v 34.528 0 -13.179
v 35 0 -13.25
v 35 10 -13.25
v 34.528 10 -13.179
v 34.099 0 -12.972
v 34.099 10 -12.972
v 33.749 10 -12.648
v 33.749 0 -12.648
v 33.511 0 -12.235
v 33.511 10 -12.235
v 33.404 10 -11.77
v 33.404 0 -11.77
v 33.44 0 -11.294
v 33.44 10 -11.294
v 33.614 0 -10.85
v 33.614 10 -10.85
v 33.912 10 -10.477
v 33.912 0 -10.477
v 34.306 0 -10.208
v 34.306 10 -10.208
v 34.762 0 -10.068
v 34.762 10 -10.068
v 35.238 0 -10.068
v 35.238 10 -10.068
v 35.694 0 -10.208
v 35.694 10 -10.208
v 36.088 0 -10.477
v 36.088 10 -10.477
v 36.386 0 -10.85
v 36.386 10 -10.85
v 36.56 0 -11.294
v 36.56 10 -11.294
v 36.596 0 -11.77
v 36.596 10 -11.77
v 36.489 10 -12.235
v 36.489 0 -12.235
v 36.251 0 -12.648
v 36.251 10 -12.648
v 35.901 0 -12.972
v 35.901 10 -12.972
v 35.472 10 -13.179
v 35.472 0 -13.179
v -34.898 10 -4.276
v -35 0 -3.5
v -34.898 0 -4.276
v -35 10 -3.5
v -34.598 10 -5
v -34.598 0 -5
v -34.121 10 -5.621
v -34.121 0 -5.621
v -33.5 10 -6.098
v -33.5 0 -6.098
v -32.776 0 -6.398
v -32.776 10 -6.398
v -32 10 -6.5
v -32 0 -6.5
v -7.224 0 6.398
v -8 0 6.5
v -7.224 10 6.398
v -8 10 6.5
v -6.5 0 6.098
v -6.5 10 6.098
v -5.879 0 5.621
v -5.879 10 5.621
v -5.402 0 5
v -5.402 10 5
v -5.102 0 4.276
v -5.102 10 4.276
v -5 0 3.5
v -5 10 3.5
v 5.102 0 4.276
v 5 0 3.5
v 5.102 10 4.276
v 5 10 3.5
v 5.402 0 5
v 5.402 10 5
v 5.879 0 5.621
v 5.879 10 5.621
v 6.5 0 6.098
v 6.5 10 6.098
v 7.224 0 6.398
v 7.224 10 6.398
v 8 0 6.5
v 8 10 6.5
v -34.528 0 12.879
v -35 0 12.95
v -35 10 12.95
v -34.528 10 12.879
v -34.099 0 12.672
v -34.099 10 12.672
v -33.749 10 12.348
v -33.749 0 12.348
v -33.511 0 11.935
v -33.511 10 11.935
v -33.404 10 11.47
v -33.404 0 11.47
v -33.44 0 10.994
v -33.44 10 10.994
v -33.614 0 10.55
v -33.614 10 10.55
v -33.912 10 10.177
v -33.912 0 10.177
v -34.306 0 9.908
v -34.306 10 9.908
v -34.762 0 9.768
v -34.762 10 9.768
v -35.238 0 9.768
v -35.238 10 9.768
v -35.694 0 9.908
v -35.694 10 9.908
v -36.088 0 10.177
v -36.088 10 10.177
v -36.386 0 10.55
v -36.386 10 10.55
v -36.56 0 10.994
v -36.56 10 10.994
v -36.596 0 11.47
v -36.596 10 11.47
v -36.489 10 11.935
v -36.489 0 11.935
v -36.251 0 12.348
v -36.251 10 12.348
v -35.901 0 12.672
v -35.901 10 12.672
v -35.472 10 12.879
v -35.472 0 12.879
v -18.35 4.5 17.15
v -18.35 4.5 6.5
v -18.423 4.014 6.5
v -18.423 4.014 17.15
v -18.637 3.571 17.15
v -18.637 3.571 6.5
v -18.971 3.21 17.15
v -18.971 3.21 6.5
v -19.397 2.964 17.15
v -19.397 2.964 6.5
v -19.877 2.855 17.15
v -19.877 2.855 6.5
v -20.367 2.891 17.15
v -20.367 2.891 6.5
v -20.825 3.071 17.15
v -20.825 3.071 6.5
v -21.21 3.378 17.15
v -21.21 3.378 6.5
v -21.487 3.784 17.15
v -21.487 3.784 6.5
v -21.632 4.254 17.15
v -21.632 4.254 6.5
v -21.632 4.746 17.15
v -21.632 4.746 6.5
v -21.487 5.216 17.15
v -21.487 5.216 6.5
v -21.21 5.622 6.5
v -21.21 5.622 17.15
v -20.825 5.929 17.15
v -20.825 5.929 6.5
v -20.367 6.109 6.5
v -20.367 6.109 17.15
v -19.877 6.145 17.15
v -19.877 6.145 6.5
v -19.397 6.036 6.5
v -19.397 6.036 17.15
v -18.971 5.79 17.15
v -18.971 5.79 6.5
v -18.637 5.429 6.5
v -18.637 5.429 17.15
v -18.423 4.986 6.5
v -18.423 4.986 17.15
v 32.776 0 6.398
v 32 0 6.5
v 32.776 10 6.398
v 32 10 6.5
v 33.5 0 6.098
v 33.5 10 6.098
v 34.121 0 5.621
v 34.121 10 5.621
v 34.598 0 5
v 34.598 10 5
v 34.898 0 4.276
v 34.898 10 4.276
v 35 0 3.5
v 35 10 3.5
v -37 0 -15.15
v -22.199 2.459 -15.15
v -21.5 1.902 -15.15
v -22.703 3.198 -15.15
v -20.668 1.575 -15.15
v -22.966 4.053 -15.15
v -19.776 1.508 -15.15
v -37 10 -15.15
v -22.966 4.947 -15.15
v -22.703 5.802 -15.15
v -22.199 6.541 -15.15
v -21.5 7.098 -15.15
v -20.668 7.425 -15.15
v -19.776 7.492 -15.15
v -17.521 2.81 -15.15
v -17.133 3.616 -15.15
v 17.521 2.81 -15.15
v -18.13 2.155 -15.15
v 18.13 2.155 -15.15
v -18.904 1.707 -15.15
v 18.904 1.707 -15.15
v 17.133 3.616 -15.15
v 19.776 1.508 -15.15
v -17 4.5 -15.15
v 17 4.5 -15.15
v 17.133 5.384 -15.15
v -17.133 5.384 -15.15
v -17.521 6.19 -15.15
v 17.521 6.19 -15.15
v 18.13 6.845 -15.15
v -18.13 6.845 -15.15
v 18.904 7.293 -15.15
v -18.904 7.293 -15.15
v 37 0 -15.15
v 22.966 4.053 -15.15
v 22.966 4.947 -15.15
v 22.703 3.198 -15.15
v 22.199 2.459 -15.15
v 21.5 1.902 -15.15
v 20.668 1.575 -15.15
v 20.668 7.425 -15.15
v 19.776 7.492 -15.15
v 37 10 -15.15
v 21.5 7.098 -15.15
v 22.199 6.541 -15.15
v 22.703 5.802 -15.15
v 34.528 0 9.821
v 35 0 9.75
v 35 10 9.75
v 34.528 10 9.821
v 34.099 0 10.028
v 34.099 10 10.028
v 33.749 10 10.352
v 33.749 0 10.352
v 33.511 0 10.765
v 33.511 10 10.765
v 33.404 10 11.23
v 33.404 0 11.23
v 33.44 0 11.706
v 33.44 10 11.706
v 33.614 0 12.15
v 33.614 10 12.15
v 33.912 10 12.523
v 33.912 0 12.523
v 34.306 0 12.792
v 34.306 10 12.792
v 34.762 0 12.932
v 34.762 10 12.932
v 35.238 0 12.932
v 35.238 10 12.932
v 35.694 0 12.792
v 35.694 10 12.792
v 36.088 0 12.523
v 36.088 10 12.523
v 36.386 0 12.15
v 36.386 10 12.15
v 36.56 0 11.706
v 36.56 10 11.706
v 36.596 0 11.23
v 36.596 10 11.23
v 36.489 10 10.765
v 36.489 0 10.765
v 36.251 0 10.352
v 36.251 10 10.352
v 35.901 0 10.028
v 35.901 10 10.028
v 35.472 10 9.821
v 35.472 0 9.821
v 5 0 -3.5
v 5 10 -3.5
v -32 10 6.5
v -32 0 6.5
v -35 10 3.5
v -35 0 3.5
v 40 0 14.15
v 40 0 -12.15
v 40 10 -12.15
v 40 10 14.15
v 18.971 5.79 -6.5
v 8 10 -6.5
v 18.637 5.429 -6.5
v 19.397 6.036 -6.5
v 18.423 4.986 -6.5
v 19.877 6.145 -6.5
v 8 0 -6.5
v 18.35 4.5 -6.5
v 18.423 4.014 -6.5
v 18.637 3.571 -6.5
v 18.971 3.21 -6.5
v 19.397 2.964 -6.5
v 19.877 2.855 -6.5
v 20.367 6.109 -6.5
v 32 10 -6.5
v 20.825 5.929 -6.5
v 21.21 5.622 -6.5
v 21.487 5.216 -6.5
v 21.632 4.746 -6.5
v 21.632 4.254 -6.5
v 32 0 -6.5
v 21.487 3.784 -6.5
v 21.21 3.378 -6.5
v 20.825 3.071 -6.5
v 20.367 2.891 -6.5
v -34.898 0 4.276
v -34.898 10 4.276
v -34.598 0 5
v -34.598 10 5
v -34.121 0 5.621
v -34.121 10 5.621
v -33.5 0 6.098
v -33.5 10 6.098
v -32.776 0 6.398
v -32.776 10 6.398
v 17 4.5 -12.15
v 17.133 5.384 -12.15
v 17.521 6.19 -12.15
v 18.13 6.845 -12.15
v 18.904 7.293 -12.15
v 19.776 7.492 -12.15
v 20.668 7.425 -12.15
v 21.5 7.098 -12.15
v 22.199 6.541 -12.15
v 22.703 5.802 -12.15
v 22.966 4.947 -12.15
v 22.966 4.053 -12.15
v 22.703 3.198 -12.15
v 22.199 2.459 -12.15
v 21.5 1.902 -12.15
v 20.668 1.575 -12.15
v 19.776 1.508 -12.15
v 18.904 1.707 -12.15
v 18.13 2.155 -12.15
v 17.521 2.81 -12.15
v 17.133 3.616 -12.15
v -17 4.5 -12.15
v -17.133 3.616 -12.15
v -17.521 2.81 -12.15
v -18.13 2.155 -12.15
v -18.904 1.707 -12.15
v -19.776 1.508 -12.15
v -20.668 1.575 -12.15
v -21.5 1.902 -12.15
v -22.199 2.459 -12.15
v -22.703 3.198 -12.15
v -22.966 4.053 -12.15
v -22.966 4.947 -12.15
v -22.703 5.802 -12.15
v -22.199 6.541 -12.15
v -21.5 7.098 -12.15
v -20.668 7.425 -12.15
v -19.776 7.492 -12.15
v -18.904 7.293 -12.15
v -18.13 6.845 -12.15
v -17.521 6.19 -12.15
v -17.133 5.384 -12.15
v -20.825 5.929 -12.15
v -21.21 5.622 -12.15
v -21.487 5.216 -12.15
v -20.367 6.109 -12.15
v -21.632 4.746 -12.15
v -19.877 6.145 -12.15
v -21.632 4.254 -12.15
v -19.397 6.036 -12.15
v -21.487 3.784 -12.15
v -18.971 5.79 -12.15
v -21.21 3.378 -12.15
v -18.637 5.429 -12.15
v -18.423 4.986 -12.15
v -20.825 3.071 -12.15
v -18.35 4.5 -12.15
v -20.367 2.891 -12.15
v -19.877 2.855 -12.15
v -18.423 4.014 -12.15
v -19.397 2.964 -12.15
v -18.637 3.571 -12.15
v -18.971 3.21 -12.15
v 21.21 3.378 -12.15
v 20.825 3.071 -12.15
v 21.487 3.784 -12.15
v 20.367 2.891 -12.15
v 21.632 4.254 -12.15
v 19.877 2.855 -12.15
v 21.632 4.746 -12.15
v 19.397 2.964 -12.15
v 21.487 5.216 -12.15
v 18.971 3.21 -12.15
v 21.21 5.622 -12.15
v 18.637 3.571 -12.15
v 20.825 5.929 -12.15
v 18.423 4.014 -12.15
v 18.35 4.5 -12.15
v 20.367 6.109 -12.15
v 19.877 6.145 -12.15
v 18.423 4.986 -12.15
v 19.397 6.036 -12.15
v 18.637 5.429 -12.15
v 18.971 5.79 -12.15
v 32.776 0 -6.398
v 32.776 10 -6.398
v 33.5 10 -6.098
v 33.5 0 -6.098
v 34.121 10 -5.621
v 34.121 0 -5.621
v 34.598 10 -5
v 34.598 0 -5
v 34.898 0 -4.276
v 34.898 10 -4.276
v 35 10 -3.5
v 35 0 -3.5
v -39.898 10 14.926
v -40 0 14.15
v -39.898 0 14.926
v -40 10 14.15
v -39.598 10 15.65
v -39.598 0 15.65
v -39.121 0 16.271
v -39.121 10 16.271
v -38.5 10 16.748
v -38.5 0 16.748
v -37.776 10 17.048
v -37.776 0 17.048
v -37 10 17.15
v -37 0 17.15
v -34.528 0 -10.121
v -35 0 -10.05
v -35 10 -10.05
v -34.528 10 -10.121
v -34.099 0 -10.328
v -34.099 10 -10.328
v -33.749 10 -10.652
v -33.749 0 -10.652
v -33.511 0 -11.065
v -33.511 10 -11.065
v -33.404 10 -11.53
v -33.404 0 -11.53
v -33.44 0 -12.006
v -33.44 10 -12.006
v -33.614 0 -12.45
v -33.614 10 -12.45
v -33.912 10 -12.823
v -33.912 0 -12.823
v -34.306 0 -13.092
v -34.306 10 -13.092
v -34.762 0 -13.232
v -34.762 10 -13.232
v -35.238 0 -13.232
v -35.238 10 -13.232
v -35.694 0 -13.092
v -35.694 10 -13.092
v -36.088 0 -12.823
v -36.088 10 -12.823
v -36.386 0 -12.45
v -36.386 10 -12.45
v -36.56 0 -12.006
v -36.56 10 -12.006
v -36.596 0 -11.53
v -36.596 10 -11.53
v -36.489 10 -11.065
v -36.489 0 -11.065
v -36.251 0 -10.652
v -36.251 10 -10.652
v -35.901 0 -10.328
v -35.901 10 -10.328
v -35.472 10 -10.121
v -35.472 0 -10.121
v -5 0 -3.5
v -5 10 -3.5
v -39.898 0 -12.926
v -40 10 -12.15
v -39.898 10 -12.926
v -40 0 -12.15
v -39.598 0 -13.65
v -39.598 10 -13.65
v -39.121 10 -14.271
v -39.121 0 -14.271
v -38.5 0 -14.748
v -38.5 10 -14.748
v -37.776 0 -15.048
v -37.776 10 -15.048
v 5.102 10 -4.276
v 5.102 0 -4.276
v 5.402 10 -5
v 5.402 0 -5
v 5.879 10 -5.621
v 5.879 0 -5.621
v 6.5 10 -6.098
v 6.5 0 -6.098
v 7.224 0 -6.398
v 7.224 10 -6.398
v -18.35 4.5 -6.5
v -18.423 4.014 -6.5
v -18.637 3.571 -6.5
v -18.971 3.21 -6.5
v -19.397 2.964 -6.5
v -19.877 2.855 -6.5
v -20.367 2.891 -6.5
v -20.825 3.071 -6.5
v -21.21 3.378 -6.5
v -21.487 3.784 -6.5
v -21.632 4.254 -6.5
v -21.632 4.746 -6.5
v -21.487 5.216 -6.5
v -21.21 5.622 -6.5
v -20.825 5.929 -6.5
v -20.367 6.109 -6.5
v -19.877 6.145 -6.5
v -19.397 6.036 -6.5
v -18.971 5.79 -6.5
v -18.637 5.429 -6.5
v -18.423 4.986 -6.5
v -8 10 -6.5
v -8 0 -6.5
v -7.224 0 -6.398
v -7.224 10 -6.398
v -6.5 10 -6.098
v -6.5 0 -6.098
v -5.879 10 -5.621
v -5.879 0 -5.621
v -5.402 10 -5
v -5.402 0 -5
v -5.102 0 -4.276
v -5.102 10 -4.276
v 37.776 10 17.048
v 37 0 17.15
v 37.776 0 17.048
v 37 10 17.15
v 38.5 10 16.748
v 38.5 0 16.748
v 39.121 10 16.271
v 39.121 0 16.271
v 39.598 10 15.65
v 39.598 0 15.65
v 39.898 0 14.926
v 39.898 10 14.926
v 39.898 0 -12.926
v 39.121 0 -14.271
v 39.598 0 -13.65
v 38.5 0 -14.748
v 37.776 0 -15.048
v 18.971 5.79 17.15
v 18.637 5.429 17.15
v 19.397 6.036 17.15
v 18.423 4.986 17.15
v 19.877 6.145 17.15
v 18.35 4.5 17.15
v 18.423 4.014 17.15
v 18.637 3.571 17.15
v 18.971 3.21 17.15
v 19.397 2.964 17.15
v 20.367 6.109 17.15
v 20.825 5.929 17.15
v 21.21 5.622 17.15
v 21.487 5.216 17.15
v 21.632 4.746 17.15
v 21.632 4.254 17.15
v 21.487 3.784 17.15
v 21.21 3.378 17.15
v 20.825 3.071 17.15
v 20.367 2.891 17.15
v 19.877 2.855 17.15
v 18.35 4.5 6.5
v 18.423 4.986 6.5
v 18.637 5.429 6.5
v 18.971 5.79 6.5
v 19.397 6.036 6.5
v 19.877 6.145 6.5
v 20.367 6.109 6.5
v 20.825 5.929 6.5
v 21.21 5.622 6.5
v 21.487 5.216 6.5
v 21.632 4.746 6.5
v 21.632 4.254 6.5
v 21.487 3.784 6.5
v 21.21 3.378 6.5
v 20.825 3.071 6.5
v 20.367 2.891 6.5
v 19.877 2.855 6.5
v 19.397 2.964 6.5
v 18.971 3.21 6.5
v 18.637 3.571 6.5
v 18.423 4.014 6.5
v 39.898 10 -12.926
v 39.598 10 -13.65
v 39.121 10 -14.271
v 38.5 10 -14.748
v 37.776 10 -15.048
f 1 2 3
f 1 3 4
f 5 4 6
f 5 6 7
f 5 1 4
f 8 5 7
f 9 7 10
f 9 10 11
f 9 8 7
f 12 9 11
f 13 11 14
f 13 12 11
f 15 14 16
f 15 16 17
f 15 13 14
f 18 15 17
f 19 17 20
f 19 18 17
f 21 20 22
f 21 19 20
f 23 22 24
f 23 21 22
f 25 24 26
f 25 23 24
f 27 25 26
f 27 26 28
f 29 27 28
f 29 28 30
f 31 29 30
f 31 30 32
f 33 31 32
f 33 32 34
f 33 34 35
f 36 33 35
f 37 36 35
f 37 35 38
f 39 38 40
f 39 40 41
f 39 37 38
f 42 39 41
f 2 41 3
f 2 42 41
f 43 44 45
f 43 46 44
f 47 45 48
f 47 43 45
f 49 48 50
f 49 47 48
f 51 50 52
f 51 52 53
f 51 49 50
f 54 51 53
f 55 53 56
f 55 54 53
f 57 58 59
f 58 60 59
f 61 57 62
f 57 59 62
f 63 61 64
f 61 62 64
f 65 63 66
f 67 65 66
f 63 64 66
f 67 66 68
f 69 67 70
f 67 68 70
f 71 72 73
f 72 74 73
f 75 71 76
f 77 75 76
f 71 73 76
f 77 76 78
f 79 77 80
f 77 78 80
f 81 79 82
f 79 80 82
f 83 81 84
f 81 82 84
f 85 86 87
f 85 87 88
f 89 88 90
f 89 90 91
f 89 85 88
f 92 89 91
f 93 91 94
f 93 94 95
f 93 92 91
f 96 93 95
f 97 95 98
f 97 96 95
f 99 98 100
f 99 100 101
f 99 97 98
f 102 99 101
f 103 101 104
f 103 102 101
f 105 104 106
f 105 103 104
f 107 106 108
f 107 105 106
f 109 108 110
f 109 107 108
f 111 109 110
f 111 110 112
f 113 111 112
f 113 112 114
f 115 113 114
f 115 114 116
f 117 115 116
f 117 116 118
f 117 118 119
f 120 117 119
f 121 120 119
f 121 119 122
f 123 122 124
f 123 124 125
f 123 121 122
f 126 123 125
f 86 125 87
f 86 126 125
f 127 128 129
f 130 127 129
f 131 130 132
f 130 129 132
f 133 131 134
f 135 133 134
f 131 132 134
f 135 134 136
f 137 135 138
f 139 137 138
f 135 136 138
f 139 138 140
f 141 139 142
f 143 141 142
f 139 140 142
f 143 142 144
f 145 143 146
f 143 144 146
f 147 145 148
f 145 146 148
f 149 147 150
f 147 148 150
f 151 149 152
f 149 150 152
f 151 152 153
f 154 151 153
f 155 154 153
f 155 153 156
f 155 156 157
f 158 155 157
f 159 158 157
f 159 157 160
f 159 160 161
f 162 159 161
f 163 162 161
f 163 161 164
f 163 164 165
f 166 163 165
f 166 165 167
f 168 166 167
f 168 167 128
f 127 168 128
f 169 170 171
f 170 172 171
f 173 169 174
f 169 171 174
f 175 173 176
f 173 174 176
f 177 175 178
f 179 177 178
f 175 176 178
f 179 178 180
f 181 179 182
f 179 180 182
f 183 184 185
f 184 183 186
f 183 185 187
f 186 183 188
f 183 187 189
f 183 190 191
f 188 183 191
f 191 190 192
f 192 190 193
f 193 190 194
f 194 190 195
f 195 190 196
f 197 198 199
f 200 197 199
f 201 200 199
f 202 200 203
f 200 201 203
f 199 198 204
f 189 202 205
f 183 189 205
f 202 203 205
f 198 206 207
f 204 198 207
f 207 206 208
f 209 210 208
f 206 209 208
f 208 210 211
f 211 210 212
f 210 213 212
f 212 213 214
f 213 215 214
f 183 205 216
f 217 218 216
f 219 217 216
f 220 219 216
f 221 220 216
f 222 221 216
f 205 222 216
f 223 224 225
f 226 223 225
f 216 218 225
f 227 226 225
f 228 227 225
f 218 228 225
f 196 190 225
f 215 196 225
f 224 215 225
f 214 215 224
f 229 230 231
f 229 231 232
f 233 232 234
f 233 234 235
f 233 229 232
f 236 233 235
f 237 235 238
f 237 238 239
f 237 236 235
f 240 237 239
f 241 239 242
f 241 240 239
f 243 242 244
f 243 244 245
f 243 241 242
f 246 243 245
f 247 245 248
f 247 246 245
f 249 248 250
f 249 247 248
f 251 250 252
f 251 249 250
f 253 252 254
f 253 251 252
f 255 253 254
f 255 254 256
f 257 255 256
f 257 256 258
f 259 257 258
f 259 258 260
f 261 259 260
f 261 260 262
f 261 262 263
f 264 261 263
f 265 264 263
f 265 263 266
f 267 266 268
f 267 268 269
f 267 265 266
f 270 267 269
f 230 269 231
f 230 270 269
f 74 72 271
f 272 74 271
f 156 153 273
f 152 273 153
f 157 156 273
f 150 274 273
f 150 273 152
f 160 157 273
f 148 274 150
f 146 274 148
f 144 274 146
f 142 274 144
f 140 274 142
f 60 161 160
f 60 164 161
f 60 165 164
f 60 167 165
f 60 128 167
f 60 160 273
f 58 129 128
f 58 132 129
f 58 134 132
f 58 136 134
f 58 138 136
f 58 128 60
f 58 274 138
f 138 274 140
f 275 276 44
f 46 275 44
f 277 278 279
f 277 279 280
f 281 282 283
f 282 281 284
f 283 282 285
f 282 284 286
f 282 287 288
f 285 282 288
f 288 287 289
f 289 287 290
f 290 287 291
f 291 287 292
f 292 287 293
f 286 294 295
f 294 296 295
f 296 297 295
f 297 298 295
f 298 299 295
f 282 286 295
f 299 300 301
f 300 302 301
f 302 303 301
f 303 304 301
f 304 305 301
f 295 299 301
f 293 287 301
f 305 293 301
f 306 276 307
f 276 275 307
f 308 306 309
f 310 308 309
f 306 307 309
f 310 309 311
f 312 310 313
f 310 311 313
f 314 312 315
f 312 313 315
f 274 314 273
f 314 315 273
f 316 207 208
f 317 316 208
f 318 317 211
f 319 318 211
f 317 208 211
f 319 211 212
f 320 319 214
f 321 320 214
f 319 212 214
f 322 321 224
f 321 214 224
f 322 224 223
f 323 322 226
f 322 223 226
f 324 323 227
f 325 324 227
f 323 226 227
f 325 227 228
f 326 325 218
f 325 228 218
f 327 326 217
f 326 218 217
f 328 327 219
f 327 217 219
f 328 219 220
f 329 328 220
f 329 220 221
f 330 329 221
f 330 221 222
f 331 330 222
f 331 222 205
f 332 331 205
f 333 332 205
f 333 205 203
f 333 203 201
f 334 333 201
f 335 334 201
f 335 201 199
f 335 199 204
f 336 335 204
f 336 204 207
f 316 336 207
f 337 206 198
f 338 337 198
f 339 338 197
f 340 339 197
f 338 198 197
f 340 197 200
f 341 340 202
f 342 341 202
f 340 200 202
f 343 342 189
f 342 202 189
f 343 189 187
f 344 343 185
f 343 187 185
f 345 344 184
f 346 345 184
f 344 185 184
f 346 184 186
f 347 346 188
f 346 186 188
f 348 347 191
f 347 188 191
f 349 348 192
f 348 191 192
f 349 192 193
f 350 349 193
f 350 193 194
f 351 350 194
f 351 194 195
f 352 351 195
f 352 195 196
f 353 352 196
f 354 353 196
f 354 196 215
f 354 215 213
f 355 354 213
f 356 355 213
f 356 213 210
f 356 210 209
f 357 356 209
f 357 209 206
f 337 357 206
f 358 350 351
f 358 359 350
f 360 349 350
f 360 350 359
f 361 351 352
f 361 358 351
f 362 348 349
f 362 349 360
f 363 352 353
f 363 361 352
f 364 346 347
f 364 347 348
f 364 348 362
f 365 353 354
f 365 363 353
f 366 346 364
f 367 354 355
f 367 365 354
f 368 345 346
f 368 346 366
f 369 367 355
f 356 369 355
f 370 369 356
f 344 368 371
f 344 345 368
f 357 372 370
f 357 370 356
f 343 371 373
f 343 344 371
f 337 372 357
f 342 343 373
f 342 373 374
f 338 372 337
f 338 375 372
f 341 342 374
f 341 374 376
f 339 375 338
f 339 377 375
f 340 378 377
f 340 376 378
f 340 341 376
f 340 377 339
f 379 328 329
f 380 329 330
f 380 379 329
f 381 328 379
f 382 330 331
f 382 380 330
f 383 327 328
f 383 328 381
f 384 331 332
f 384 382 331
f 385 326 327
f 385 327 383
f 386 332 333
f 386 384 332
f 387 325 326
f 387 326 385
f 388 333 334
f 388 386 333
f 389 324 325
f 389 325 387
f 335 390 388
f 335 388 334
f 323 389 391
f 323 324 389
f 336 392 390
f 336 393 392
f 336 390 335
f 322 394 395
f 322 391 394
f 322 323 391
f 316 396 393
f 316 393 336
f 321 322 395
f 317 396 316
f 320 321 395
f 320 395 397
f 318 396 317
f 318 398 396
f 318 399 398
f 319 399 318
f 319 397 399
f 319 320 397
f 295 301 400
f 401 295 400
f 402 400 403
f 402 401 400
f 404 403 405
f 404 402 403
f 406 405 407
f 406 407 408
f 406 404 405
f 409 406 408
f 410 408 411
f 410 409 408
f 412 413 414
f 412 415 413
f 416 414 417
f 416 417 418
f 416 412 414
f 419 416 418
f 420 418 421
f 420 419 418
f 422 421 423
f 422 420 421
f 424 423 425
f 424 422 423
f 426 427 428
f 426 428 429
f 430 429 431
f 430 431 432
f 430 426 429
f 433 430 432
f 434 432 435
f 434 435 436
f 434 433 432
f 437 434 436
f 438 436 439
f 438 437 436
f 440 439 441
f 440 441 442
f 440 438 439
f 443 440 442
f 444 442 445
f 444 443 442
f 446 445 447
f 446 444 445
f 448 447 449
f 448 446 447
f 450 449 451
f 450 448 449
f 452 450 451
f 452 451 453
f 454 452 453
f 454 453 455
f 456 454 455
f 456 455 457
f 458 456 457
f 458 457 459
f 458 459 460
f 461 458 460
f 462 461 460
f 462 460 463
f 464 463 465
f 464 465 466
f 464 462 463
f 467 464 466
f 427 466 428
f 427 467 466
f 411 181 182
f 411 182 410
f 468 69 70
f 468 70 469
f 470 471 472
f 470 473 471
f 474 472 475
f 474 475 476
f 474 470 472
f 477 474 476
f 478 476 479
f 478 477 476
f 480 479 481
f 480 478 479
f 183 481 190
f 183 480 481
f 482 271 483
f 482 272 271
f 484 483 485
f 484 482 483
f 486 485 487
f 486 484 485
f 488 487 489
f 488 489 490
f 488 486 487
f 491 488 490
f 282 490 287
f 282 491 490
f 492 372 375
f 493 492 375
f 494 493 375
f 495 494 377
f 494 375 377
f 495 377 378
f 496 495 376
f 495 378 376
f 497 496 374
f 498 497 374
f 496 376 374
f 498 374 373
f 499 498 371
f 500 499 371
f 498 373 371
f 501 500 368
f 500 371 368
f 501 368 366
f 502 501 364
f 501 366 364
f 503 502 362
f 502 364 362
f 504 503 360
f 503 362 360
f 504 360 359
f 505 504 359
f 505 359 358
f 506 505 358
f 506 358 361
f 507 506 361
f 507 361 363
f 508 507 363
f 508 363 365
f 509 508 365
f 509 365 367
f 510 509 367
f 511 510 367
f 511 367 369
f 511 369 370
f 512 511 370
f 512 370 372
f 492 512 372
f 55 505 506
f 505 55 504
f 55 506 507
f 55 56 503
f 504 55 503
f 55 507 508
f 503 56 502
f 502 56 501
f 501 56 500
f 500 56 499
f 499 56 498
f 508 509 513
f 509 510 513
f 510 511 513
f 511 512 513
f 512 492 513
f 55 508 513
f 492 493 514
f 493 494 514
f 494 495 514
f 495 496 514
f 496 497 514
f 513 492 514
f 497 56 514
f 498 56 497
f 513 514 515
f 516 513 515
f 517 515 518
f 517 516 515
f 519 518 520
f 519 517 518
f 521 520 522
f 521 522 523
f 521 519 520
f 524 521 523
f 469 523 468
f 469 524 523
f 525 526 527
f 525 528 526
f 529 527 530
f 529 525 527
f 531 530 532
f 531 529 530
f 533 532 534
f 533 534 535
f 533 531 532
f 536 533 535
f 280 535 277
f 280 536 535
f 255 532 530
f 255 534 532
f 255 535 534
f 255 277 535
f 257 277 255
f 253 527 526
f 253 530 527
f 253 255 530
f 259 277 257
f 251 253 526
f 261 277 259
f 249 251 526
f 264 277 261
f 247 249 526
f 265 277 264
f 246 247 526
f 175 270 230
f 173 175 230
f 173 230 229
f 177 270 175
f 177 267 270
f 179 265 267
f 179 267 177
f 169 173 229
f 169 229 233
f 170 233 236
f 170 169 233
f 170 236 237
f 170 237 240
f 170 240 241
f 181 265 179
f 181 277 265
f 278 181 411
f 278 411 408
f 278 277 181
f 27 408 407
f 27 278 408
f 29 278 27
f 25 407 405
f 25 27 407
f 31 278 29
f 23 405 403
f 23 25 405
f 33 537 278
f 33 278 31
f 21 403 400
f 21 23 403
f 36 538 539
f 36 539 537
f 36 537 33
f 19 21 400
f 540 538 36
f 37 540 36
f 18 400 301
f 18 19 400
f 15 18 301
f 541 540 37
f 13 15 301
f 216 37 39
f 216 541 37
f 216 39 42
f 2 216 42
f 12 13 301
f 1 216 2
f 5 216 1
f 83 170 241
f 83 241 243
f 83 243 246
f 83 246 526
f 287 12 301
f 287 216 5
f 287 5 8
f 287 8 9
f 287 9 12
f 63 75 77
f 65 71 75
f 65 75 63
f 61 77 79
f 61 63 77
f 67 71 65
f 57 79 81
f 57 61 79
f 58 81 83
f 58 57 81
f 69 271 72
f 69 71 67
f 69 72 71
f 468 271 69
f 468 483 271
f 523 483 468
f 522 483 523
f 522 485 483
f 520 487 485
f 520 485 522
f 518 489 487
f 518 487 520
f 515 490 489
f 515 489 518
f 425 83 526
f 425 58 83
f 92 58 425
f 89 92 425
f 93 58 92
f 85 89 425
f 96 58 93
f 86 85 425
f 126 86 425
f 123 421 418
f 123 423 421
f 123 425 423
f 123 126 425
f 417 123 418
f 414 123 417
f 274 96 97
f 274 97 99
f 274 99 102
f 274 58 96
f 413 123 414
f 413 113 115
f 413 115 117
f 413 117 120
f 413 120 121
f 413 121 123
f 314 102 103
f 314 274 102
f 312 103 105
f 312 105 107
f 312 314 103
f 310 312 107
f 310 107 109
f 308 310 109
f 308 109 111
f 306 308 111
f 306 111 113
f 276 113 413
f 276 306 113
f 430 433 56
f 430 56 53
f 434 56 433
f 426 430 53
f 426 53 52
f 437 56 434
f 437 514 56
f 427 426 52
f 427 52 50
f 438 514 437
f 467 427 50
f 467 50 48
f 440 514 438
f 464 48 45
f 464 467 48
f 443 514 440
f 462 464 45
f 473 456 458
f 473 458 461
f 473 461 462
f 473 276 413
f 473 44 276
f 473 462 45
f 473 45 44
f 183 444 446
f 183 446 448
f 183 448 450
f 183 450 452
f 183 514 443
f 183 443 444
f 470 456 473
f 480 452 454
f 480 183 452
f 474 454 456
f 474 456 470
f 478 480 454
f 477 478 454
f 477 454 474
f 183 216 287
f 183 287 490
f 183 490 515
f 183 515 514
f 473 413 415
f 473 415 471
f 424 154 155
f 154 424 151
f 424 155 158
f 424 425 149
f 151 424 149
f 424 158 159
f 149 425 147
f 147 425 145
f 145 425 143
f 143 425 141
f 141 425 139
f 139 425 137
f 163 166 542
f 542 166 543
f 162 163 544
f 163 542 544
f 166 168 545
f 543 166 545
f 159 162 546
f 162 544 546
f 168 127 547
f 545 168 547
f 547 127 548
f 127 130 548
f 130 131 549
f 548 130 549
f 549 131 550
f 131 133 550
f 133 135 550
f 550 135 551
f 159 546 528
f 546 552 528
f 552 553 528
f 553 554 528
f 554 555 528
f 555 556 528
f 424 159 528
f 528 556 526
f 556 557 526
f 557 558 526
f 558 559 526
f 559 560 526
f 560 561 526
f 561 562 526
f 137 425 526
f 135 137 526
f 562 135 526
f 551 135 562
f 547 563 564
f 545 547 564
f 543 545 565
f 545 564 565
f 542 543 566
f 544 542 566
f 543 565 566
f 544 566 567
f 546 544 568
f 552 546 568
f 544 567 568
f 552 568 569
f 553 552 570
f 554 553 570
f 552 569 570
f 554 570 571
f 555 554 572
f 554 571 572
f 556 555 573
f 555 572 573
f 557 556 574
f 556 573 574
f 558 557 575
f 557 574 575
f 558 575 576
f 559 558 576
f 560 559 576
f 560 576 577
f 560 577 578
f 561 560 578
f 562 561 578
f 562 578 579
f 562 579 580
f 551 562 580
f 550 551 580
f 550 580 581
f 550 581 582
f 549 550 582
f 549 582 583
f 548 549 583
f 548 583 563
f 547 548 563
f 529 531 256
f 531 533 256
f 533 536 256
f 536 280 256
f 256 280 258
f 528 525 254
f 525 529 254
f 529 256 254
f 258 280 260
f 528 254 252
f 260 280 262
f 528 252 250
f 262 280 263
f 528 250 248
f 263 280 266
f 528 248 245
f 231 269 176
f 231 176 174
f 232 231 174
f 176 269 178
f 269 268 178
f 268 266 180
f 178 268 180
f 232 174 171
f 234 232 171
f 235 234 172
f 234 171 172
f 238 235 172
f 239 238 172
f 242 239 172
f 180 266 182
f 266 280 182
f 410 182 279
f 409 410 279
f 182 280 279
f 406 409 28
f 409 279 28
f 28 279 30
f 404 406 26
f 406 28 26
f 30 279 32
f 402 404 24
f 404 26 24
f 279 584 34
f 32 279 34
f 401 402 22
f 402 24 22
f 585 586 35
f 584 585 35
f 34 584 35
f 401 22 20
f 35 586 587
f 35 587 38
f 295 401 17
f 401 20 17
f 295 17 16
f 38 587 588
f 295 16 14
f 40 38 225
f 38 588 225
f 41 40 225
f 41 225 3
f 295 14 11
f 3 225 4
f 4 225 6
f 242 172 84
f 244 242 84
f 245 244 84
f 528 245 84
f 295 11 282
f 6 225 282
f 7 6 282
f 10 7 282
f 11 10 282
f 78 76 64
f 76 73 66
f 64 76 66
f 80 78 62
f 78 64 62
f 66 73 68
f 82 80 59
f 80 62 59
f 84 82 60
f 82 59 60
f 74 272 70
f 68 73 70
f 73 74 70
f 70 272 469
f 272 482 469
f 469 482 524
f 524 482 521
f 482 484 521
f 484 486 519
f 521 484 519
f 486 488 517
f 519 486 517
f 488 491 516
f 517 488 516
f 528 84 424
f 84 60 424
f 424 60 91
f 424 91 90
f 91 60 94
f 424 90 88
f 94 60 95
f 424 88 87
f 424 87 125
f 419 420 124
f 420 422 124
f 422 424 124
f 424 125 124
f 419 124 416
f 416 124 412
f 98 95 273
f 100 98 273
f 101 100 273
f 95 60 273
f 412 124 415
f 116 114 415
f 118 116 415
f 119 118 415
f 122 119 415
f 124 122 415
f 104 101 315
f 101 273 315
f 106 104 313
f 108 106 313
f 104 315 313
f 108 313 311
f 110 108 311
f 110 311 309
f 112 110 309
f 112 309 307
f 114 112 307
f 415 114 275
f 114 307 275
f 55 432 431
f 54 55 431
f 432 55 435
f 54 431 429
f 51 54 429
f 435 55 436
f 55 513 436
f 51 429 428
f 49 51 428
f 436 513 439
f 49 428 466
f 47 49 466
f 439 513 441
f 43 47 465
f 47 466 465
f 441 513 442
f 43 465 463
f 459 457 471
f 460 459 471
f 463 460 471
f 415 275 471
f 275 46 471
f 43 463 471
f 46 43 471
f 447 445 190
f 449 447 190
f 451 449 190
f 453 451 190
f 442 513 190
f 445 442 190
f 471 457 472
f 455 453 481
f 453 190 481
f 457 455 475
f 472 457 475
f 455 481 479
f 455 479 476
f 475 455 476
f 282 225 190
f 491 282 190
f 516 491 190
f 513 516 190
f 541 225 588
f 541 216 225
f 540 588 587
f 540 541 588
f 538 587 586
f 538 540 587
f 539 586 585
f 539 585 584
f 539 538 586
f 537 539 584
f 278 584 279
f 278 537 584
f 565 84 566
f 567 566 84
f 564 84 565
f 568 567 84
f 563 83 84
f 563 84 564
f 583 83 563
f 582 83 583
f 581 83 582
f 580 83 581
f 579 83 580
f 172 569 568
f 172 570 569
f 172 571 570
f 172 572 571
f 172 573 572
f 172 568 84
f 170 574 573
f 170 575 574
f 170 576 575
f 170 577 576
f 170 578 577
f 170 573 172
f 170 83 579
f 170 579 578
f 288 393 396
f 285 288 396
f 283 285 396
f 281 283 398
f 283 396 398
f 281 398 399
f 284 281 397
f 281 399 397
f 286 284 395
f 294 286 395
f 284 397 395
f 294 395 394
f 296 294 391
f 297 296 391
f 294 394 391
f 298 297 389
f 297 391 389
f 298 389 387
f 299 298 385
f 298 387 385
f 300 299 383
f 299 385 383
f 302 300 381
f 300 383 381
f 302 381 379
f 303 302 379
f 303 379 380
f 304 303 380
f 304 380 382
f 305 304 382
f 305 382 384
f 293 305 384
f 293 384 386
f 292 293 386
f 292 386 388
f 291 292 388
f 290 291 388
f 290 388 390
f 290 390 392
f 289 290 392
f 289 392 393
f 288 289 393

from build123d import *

# Parameters (mm, degrees)
SKETCH_1_R          = 1.6
SKETCH_1_W          = 30
SKETCH_1_H          = 13
EXTRUDE_1_DEPTH     = 10
SKETCH_2_R          = 1.65
CUT_EXTRUDE_1_DEPTH = 54.632918996
SKETCH_4_R          = 3
CUT_EXTRUDE_3_DEPTH = 5
SKETCH_6_W          = 80
SKETCH_6_H          = 2
CUT_EXTRUDE_5_DEPTH = 45.655598753
FILLET_1_R          = 3


with BuildPart() as part:
    # 草图1 → 凸台-拉伸1 (new body)
    with BuildSketch(Plane(origin=(0, 0, 0), x_dir=(1, 0, 0), z_dir=(0, 1, 0))):
        Polygon((-40, -17.15), (-40, 17.15), (40, 17.15), (40, -17.15), (20, -17.15), (-20, -17.15), align=None)
        with Locations(Location((-35, 11.65, 0), (0, 0, 270))):
            Circle(SKETCH_1_R, mode=Mode.SUBTRACT)
        with Locations(Location((-35, -11.35, 0), (0, 0, 270))):
            Circle(SKETCH_1_R, mode=Mode.SUBTRACT)
        with Locations(Location((35, -11.35, 0), (0, 0, 90))):
            Circle(SKETCH_1_R, mode=Mode.SUBTRACT)
        with Locations(Location((35, 11.65, 0), (0, 0, 90))):
            Circle(SKETCH_1_R, mode=Mode.SUBTRACT)
        with Locations((-20, 0)):
            Rectangle(SKETCH_1_W, SKETCH_1_H, mode=Mode.SUBTRACT)
        with Locations((20, 0)):
            Rectangle(SKETCH_1_W, SKETCH_1_H, mode=Mode.SUBTRACT)
    extrude(amount=EXTRUDE_1_DEPTH)

    # 草图2 → 切除-拉伸1 (cut, through all)
    with BuildSketch(Plane(origin=(0, 0, -17.15), x_dir=(-1, 0, 0), z_dir=(0, 0, -1))):
        with Locations((-20, 4.5)):
            Circle(SKETCH_2_R)
        with Locations(Location((20, 4.5, 0), (0, 0, 180))):
            Circle(SKETCH_2_R)
    extrude(amount=-CUT_EXTRUDE_1_DEPTH, mode=Mode.SUBTRACT)

    # 草图4 → 切除-拉伸3 (cut)
    with BuildSketch(Plane(origin=(0, 0, -17.15), x_dir=(-1, 0, 0), z_dir=(0, 0, -1))):
        with Locations((-20, 4.5)):
            Circle(SKETCH_4_R)
        with Locations(Location((20, 4.5, 0), (0, 0, 180))):
            Circle(SKETCH_4_R)
    extrude(amount=-CUT_EXTRUDE_3_DEPTH, mode=Mode.SUBTRACT)

    # 草图6 → 切除-拉伸5 (cut, through all)
    with BuildSketch(Plane(origin=(0, 10, 0), x_dir=(1, 0, 0), z_dir=(0, 1, 0))):
        with Locations((0, 16.15)):
            Rectangle(SKETCH_6_W, SKETCH_6_H)
    extrude(amount=-CUT_EXTRUDE_5_DEPTH, mode=Mode.SUBTRACT)

    # 圆角1
    fillet_1_edges = [part.edges().sort_by_distance(p)[0] for p in [
        (40, 5, -15.15),
        (-40, 5, -15.15),
        (40, 5, 17.15),
        (-40, 5, 17.15),
        (-35, 5, -6.5),
        (-35, 5, 6.5),
        (-5, 5, 6.5),
        (-5, 5, -6.5),
        (35, 5, -6.5),
        (5, 5, -6.5),
        (5, 5, 6.5),
        (35, 5, 6.5),
    ]]
    fillet(fillet_1_edges, radius=FILLET_1_R)


solid = part.part
